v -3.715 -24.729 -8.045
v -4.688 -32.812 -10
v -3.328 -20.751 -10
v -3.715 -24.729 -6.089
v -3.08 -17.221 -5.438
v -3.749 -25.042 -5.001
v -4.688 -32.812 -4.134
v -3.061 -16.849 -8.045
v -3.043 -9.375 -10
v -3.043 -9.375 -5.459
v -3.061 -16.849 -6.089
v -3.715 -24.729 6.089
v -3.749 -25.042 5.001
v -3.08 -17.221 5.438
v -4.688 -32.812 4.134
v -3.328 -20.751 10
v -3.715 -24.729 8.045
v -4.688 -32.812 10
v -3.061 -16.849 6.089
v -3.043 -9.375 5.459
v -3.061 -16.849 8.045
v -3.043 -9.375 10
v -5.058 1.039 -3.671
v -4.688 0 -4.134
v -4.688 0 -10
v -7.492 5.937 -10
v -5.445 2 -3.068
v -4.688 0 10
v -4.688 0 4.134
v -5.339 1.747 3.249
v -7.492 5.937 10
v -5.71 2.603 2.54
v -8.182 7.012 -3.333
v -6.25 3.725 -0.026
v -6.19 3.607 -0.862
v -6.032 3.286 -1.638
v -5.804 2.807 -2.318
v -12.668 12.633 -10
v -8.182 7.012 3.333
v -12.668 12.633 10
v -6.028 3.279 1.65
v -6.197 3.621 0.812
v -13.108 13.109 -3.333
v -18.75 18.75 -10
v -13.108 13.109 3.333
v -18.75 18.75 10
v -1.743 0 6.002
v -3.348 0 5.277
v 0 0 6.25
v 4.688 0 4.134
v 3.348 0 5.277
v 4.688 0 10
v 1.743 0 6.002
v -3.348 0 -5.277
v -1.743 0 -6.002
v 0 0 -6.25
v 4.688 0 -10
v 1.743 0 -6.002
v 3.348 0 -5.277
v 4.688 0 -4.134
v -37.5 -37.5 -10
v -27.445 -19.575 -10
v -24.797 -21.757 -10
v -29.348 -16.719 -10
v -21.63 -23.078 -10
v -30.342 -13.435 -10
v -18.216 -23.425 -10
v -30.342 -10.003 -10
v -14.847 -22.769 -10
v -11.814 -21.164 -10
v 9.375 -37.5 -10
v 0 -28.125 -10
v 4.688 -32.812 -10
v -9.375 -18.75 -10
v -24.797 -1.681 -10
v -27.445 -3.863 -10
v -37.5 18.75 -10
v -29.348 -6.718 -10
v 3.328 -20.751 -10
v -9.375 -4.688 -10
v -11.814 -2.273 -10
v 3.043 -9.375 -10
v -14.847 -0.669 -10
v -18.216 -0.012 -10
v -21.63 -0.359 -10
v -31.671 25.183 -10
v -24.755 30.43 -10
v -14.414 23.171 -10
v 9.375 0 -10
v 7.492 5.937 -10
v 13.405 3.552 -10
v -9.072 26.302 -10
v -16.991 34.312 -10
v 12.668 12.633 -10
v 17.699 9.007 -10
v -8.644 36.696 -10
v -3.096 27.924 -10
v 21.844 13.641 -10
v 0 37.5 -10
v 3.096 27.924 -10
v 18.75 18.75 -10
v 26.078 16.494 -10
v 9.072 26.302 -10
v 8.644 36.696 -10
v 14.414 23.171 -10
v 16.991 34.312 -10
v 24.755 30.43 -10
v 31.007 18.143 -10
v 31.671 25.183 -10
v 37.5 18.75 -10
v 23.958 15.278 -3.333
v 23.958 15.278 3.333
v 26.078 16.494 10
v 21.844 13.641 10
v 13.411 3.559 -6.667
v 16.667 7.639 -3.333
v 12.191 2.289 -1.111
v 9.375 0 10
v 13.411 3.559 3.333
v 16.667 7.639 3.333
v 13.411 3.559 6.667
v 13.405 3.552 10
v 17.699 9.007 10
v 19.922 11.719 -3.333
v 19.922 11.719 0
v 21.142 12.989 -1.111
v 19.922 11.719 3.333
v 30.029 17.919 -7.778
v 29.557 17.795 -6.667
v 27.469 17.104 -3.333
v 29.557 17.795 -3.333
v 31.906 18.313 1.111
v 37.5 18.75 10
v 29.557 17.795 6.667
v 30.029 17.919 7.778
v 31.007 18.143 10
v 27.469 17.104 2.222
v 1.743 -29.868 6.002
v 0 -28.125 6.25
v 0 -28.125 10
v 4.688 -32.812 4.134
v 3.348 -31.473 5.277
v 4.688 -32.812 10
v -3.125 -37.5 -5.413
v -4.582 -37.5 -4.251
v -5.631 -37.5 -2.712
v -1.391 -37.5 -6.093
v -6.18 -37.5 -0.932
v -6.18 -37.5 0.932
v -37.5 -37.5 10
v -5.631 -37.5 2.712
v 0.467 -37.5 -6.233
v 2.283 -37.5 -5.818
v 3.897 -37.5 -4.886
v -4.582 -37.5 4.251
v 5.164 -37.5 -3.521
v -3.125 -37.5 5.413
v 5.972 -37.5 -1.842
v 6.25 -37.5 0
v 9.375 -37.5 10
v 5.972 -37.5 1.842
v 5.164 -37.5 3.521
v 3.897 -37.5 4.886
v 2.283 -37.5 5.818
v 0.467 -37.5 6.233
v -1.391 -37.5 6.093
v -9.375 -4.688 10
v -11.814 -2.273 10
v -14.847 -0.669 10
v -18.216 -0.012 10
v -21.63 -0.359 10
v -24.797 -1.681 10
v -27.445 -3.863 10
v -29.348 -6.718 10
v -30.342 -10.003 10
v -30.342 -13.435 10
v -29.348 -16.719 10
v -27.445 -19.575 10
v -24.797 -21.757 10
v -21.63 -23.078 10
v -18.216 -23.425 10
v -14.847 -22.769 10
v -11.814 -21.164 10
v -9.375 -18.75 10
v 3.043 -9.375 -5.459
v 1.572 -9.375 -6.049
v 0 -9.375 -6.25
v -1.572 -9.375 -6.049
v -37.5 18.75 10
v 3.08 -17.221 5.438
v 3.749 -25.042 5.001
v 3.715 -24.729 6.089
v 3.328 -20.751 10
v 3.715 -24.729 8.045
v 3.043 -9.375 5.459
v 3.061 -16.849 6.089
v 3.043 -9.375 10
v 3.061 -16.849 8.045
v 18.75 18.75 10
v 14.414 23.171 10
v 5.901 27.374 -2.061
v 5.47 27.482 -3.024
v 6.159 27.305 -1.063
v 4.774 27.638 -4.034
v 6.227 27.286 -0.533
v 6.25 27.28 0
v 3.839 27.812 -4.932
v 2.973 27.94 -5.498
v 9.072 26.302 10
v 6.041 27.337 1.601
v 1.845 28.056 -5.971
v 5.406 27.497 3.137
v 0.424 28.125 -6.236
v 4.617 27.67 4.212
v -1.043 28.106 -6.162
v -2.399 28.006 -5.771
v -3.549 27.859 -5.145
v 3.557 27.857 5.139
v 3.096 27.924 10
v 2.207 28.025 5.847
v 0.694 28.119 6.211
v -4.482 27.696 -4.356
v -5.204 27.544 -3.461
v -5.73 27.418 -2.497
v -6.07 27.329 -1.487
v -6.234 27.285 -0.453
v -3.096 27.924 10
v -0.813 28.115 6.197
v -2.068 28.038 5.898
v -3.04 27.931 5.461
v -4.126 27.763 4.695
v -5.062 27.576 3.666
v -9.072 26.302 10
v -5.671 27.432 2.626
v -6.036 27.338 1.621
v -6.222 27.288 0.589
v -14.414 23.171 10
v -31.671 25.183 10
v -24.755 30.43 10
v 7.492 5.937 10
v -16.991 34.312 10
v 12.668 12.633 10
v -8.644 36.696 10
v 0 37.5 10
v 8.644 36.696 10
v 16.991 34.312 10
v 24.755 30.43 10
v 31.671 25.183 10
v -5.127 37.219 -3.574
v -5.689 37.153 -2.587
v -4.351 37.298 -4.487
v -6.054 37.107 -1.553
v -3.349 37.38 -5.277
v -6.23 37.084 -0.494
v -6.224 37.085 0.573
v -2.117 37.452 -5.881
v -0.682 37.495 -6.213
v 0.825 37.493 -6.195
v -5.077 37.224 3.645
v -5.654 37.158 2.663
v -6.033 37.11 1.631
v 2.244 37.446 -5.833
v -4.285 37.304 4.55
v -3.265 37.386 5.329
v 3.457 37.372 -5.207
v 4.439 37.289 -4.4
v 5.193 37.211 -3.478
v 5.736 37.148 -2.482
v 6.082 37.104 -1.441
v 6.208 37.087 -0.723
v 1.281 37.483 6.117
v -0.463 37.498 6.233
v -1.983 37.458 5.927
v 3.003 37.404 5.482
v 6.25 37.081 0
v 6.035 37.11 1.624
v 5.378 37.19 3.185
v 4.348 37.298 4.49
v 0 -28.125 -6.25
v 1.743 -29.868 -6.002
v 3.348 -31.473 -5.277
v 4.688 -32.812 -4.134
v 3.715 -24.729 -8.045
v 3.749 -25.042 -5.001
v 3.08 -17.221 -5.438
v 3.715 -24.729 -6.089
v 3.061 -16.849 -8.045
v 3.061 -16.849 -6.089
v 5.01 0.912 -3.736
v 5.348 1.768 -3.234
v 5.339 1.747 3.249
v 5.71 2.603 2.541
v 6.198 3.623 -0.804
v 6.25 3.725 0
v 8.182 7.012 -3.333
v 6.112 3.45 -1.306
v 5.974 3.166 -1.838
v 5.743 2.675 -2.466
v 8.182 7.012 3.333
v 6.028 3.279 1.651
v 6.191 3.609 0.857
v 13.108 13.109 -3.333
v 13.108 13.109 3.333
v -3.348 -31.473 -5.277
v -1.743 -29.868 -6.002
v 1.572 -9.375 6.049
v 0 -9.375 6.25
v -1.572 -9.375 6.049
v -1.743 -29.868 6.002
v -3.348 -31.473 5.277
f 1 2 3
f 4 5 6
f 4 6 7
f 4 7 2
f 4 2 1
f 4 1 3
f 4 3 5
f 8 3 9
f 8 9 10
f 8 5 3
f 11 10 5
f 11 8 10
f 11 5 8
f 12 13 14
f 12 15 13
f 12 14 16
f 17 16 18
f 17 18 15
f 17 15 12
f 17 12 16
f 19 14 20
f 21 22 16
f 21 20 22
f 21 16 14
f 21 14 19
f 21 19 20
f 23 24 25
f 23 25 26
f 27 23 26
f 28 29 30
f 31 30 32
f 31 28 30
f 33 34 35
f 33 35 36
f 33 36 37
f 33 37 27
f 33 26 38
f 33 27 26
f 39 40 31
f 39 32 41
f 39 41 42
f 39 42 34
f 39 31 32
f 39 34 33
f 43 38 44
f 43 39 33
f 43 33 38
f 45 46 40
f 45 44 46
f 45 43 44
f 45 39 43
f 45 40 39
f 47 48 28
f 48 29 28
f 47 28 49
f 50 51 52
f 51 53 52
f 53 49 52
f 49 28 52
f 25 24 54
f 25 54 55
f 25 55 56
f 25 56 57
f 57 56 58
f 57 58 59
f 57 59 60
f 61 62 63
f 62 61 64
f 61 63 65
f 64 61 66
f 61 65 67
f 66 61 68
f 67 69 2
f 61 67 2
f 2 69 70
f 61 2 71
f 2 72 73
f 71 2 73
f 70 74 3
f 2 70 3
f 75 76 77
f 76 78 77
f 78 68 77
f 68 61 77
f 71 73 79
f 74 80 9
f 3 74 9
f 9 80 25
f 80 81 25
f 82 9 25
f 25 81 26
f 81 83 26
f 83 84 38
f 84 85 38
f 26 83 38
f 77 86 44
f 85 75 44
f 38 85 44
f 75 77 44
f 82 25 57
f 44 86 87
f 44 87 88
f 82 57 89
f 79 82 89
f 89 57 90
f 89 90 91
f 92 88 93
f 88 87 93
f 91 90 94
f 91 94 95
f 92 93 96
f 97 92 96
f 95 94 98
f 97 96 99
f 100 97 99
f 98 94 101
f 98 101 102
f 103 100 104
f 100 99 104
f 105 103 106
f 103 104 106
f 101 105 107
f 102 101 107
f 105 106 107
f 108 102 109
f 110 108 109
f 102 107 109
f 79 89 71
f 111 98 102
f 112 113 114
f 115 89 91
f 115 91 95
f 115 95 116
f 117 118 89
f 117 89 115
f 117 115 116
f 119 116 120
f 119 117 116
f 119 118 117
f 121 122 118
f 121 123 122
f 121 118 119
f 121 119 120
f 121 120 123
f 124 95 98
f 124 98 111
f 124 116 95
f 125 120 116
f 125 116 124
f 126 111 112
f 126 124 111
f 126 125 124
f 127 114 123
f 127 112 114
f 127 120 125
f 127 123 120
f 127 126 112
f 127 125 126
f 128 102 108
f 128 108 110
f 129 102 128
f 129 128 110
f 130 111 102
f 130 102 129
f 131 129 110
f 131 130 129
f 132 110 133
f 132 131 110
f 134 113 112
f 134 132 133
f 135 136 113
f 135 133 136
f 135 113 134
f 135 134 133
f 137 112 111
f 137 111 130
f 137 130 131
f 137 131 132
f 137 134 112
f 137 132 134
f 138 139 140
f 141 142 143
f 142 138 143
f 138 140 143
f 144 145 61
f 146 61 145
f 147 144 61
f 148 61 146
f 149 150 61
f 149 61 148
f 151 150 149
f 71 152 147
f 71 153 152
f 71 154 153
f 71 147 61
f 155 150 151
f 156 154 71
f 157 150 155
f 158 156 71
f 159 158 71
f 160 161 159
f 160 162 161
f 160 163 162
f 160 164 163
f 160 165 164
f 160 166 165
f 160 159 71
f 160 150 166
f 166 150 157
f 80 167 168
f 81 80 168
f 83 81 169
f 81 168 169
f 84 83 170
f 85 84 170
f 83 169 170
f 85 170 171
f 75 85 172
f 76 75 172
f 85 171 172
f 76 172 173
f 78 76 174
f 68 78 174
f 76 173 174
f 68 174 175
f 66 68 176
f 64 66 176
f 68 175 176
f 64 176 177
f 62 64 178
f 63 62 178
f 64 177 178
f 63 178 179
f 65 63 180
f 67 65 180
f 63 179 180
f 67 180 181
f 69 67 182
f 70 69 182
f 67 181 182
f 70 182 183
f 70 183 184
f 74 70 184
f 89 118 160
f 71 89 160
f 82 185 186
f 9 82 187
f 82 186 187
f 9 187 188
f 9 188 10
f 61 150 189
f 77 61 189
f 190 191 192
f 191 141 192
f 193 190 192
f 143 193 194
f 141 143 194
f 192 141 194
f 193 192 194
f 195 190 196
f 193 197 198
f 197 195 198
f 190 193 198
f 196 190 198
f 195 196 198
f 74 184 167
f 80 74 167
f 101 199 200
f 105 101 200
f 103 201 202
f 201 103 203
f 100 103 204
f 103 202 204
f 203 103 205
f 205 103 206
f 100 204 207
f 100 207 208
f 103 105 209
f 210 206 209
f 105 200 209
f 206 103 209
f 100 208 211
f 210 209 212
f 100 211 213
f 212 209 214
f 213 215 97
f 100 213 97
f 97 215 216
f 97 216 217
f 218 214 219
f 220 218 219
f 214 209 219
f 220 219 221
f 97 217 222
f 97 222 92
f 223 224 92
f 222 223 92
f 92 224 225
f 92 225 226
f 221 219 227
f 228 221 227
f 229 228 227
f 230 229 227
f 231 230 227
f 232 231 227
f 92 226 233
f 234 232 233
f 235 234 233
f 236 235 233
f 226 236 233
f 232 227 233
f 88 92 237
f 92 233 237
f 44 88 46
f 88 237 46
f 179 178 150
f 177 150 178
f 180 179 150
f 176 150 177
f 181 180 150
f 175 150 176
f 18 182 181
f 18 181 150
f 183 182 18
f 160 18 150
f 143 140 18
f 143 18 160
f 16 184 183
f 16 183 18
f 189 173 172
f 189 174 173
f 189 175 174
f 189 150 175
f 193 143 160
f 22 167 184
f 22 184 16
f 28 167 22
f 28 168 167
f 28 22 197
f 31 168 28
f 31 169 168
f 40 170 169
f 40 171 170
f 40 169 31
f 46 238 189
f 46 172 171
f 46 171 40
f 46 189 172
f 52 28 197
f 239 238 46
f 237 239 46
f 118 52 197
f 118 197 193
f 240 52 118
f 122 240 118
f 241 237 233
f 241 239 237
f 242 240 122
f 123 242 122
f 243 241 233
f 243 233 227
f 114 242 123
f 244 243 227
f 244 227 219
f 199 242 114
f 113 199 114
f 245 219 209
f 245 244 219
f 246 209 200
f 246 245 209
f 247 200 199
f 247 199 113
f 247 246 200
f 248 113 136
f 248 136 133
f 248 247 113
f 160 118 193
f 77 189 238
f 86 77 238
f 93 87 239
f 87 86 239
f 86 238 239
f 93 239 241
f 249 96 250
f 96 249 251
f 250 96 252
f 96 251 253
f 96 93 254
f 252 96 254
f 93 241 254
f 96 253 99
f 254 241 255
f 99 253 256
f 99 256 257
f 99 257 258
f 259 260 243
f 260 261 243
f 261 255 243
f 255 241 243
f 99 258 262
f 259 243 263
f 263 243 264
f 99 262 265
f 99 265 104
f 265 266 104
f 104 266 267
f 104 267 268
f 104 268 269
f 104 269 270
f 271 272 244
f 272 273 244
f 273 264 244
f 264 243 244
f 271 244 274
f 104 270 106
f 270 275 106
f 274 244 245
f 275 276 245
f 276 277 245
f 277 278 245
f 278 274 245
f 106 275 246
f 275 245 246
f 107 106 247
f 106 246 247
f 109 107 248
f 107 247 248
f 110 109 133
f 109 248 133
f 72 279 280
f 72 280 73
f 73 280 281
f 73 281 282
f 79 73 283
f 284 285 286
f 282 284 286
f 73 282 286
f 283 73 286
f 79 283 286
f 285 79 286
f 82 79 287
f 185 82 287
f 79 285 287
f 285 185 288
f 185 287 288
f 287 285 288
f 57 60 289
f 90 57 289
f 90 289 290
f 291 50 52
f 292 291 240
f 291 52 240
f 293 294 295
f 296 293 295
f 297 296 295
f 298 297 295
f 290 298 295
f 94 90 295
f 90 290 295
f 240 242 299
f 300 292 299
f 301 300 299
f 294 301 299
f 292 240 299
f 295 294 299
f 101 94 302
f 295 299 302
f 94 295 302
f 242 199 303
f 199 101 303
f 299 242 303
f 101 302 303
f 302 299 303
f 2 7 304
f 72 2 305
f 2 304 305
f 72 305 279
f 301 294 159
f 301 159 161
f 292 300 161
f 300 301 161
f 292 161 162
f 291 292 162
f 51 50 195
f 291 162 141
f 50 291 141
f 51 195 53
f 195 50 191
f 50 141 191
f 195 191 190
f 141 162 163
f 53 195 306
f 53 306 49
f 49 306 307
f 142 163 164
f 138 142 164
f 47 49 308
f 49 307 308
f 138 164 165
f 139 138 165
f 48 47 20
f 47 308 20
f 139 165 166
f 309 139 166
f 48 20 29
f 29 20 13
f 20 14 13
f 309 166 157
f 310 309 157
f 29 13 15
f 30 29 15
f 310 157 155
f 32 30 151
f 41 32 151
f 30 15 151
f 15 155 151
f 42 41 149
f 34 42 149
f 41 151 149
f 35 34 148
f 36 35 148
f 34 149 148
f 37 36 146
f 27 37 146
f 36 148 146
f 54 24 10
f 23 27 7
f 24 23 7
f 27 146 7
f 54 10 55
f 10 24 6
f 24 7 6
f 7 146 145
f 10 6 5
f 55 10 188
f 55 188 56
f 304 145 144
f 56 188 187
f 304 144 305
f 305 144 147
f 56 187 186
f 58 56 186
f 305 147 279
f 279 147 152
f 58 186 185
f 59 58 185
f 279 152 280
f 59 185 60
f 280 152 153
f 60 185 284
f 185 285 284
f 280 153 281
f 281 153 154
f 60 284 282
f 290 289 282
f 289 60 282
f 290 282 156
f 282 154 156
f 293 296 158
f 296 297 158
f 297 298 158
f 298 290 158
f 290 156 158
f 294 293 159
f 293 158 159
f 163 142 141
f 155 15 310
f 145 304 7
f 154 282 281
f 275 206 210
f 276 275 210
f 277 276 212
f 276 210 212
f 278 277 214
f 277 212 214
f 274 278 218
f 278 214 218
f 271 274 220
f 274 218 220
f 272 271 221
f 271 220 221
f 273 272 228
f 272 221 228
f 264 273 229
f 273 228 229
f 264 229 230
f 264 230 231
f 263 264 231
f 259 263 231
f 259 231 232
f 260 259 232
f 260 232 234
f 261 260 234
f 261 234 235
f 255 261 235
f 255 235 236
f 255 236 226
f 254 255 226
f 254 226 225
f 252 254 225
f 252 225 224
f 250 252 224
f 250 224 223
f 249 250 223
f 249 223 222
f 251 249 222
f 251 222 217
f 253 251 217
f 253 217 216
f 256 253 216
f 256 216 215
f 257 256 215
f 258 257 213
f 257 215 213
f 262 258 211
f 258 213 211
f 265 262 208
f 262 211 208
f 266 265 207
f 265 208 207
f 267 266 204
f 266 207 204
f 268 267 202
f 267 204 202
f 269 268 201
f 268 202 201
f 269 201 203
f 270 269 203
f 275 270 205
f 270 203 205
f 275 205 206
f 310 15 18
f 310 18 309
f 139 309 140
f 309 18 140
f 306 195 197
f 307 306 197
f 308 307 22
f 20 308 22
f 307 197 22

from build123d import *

# Parameters (mm, degrees)
F0_W          = 75
F0_H          = 75
F1_DEPTH      = 10
F1_DEPTH_BACK = 10
F3_DEPTH      = 20
F4_R          = 6.25
F5_DEPTH      = 75


# Not quite as in the source:
# - a feature names something its author has since deleted; it is built from what else it names


with BuildPart() as f1:
    # F0 (on Top) → F1 (new body, two sides)
    with BuildSketch(Plane.XY) as f1_sk:
        Rectangle(F0_W, F0_H)
    extrude(amount=F1_DEPTH)
    extrude(f1_sk.sketch, amount=-F1_DEPTH_BACK)

    # F2 (on face) → F3 (cut)
    with BuildSketch(Plane.XY.offset(10)):
        with BuildLine():
            Line((37.5, -37.5), (37.5, 18.75))
            add(Edge.make_bspline(
                [(9.375, 0), (18.75, 6.25), (18.75, 18.75), (37.5, 18.75)],
                knots=[0, 0, 0, 0, 33.8020432075, 33.8020432075, 33.8020432075, 33.8020432075], degree=3))
            Line((9.375, 0), (9.375, -37.5))
            Line((9.375, -37.5), (18.75, -37.5))
            Line((18.75, -37.5), (37.5, -37.5))
        make_face()
        with BuildLine():
            ThreePointArc((0, 37.5), (20.9631372891, 32.5512745781), (37.5, 18.75))
            Line((37.5, 18.75), (37.5, 37.5))
            Line((37.5, 37.5), (0, 37.5))
        make_face()
        with BuildLine():
            ThreePointArc((-37.5, 18.75), (-20.9631372891, 32.5512745781), (0, 37.5))
            Line((0, 37.5), (-37.5, 37.5))
            Line((-37.5, 37.5), (-37.5, 18.75))
        make_face()
        with BuildLine():
            Line((0, -28.125), (4.6875, -32.8125))
            add(Edge.make_bspline(
                [(4.6875, -32.8125), (3.6620711894, -24.6951237234), (2.6366423788, -16.5777474468), (3.0432450075, -9.375)],
                knots=[0, 0, 0, 0, 0.3697687561, 0.3697687561, 0.3697687561, 0.3697687561], degree=3))
            Line((3.0432450075, -9.375), (-3.0432450075, -9.375))
            add(Edge.make_bspline(
                [(-4.6875, -32.8125), (-3.6620711894, -24.6951237234), (-2.6366423788, -16.5777474468), (-3.0432450075, -9.375)],
                knots=[0, 0, 0, 0, 0.3697687561, 0.3697687561, 0.3697687561, 0.3697687561], degree=3))
            Line((-4.6875, -32.8125), (0, -28.125))
        make_face()
        with BuildLine():
            Line((-9.375, -18.75), (-9.375, -4.6875))
            ThreePointArc((-9.375, -4.6875), (-25.78125, -2.34375), (-28.125, -18.75))
            ThreePointArc((-28.125, -18.75), (-18.75, -23.4375), (-9.375, -18.75))
        make_face()
        with BuildLine():
            Line((-4.6875, 0), (4.6875, 0))
            add(Edge.make_bspline(
                [(4.6875, 0), (7.2279380084, 7.6213140251), (12.9889690042, 13.1856570125), (18.75, 18.75)],
                knots=[0.5419601085, 0.5419601085, 0.5419601085, 0.5419601085, 1, 1, 1, 1], degree=3))
            ThreePointArc((18.75, 18.75), (0, 28.1290022772), (-18.75, 18.75))
            add(Edge.make_bspline(
                [(-4.6875, 0), (-7.2279380084, 7.6213140251), (-12.9889690042, 13.1856570125), (-18.75, 18.75)],
                knots=[0.5419601085, 0.5419601085, 0.5419601085, 0.5419601085, 1, 1, 1, 1], degree=3))
        make_face()
    extrude(amount=-F3_DEPTH, mode=Mode.SUBTRACT)

    # F4 (on face) → F5 (cut)
    with BuildSketch(Plane.XZ.offset(37.5)):
        Circle(F4_R)
    extrude(amount=-F5_DEPTH, mode=Mode.SUBTRACT)


solid = f1.part
